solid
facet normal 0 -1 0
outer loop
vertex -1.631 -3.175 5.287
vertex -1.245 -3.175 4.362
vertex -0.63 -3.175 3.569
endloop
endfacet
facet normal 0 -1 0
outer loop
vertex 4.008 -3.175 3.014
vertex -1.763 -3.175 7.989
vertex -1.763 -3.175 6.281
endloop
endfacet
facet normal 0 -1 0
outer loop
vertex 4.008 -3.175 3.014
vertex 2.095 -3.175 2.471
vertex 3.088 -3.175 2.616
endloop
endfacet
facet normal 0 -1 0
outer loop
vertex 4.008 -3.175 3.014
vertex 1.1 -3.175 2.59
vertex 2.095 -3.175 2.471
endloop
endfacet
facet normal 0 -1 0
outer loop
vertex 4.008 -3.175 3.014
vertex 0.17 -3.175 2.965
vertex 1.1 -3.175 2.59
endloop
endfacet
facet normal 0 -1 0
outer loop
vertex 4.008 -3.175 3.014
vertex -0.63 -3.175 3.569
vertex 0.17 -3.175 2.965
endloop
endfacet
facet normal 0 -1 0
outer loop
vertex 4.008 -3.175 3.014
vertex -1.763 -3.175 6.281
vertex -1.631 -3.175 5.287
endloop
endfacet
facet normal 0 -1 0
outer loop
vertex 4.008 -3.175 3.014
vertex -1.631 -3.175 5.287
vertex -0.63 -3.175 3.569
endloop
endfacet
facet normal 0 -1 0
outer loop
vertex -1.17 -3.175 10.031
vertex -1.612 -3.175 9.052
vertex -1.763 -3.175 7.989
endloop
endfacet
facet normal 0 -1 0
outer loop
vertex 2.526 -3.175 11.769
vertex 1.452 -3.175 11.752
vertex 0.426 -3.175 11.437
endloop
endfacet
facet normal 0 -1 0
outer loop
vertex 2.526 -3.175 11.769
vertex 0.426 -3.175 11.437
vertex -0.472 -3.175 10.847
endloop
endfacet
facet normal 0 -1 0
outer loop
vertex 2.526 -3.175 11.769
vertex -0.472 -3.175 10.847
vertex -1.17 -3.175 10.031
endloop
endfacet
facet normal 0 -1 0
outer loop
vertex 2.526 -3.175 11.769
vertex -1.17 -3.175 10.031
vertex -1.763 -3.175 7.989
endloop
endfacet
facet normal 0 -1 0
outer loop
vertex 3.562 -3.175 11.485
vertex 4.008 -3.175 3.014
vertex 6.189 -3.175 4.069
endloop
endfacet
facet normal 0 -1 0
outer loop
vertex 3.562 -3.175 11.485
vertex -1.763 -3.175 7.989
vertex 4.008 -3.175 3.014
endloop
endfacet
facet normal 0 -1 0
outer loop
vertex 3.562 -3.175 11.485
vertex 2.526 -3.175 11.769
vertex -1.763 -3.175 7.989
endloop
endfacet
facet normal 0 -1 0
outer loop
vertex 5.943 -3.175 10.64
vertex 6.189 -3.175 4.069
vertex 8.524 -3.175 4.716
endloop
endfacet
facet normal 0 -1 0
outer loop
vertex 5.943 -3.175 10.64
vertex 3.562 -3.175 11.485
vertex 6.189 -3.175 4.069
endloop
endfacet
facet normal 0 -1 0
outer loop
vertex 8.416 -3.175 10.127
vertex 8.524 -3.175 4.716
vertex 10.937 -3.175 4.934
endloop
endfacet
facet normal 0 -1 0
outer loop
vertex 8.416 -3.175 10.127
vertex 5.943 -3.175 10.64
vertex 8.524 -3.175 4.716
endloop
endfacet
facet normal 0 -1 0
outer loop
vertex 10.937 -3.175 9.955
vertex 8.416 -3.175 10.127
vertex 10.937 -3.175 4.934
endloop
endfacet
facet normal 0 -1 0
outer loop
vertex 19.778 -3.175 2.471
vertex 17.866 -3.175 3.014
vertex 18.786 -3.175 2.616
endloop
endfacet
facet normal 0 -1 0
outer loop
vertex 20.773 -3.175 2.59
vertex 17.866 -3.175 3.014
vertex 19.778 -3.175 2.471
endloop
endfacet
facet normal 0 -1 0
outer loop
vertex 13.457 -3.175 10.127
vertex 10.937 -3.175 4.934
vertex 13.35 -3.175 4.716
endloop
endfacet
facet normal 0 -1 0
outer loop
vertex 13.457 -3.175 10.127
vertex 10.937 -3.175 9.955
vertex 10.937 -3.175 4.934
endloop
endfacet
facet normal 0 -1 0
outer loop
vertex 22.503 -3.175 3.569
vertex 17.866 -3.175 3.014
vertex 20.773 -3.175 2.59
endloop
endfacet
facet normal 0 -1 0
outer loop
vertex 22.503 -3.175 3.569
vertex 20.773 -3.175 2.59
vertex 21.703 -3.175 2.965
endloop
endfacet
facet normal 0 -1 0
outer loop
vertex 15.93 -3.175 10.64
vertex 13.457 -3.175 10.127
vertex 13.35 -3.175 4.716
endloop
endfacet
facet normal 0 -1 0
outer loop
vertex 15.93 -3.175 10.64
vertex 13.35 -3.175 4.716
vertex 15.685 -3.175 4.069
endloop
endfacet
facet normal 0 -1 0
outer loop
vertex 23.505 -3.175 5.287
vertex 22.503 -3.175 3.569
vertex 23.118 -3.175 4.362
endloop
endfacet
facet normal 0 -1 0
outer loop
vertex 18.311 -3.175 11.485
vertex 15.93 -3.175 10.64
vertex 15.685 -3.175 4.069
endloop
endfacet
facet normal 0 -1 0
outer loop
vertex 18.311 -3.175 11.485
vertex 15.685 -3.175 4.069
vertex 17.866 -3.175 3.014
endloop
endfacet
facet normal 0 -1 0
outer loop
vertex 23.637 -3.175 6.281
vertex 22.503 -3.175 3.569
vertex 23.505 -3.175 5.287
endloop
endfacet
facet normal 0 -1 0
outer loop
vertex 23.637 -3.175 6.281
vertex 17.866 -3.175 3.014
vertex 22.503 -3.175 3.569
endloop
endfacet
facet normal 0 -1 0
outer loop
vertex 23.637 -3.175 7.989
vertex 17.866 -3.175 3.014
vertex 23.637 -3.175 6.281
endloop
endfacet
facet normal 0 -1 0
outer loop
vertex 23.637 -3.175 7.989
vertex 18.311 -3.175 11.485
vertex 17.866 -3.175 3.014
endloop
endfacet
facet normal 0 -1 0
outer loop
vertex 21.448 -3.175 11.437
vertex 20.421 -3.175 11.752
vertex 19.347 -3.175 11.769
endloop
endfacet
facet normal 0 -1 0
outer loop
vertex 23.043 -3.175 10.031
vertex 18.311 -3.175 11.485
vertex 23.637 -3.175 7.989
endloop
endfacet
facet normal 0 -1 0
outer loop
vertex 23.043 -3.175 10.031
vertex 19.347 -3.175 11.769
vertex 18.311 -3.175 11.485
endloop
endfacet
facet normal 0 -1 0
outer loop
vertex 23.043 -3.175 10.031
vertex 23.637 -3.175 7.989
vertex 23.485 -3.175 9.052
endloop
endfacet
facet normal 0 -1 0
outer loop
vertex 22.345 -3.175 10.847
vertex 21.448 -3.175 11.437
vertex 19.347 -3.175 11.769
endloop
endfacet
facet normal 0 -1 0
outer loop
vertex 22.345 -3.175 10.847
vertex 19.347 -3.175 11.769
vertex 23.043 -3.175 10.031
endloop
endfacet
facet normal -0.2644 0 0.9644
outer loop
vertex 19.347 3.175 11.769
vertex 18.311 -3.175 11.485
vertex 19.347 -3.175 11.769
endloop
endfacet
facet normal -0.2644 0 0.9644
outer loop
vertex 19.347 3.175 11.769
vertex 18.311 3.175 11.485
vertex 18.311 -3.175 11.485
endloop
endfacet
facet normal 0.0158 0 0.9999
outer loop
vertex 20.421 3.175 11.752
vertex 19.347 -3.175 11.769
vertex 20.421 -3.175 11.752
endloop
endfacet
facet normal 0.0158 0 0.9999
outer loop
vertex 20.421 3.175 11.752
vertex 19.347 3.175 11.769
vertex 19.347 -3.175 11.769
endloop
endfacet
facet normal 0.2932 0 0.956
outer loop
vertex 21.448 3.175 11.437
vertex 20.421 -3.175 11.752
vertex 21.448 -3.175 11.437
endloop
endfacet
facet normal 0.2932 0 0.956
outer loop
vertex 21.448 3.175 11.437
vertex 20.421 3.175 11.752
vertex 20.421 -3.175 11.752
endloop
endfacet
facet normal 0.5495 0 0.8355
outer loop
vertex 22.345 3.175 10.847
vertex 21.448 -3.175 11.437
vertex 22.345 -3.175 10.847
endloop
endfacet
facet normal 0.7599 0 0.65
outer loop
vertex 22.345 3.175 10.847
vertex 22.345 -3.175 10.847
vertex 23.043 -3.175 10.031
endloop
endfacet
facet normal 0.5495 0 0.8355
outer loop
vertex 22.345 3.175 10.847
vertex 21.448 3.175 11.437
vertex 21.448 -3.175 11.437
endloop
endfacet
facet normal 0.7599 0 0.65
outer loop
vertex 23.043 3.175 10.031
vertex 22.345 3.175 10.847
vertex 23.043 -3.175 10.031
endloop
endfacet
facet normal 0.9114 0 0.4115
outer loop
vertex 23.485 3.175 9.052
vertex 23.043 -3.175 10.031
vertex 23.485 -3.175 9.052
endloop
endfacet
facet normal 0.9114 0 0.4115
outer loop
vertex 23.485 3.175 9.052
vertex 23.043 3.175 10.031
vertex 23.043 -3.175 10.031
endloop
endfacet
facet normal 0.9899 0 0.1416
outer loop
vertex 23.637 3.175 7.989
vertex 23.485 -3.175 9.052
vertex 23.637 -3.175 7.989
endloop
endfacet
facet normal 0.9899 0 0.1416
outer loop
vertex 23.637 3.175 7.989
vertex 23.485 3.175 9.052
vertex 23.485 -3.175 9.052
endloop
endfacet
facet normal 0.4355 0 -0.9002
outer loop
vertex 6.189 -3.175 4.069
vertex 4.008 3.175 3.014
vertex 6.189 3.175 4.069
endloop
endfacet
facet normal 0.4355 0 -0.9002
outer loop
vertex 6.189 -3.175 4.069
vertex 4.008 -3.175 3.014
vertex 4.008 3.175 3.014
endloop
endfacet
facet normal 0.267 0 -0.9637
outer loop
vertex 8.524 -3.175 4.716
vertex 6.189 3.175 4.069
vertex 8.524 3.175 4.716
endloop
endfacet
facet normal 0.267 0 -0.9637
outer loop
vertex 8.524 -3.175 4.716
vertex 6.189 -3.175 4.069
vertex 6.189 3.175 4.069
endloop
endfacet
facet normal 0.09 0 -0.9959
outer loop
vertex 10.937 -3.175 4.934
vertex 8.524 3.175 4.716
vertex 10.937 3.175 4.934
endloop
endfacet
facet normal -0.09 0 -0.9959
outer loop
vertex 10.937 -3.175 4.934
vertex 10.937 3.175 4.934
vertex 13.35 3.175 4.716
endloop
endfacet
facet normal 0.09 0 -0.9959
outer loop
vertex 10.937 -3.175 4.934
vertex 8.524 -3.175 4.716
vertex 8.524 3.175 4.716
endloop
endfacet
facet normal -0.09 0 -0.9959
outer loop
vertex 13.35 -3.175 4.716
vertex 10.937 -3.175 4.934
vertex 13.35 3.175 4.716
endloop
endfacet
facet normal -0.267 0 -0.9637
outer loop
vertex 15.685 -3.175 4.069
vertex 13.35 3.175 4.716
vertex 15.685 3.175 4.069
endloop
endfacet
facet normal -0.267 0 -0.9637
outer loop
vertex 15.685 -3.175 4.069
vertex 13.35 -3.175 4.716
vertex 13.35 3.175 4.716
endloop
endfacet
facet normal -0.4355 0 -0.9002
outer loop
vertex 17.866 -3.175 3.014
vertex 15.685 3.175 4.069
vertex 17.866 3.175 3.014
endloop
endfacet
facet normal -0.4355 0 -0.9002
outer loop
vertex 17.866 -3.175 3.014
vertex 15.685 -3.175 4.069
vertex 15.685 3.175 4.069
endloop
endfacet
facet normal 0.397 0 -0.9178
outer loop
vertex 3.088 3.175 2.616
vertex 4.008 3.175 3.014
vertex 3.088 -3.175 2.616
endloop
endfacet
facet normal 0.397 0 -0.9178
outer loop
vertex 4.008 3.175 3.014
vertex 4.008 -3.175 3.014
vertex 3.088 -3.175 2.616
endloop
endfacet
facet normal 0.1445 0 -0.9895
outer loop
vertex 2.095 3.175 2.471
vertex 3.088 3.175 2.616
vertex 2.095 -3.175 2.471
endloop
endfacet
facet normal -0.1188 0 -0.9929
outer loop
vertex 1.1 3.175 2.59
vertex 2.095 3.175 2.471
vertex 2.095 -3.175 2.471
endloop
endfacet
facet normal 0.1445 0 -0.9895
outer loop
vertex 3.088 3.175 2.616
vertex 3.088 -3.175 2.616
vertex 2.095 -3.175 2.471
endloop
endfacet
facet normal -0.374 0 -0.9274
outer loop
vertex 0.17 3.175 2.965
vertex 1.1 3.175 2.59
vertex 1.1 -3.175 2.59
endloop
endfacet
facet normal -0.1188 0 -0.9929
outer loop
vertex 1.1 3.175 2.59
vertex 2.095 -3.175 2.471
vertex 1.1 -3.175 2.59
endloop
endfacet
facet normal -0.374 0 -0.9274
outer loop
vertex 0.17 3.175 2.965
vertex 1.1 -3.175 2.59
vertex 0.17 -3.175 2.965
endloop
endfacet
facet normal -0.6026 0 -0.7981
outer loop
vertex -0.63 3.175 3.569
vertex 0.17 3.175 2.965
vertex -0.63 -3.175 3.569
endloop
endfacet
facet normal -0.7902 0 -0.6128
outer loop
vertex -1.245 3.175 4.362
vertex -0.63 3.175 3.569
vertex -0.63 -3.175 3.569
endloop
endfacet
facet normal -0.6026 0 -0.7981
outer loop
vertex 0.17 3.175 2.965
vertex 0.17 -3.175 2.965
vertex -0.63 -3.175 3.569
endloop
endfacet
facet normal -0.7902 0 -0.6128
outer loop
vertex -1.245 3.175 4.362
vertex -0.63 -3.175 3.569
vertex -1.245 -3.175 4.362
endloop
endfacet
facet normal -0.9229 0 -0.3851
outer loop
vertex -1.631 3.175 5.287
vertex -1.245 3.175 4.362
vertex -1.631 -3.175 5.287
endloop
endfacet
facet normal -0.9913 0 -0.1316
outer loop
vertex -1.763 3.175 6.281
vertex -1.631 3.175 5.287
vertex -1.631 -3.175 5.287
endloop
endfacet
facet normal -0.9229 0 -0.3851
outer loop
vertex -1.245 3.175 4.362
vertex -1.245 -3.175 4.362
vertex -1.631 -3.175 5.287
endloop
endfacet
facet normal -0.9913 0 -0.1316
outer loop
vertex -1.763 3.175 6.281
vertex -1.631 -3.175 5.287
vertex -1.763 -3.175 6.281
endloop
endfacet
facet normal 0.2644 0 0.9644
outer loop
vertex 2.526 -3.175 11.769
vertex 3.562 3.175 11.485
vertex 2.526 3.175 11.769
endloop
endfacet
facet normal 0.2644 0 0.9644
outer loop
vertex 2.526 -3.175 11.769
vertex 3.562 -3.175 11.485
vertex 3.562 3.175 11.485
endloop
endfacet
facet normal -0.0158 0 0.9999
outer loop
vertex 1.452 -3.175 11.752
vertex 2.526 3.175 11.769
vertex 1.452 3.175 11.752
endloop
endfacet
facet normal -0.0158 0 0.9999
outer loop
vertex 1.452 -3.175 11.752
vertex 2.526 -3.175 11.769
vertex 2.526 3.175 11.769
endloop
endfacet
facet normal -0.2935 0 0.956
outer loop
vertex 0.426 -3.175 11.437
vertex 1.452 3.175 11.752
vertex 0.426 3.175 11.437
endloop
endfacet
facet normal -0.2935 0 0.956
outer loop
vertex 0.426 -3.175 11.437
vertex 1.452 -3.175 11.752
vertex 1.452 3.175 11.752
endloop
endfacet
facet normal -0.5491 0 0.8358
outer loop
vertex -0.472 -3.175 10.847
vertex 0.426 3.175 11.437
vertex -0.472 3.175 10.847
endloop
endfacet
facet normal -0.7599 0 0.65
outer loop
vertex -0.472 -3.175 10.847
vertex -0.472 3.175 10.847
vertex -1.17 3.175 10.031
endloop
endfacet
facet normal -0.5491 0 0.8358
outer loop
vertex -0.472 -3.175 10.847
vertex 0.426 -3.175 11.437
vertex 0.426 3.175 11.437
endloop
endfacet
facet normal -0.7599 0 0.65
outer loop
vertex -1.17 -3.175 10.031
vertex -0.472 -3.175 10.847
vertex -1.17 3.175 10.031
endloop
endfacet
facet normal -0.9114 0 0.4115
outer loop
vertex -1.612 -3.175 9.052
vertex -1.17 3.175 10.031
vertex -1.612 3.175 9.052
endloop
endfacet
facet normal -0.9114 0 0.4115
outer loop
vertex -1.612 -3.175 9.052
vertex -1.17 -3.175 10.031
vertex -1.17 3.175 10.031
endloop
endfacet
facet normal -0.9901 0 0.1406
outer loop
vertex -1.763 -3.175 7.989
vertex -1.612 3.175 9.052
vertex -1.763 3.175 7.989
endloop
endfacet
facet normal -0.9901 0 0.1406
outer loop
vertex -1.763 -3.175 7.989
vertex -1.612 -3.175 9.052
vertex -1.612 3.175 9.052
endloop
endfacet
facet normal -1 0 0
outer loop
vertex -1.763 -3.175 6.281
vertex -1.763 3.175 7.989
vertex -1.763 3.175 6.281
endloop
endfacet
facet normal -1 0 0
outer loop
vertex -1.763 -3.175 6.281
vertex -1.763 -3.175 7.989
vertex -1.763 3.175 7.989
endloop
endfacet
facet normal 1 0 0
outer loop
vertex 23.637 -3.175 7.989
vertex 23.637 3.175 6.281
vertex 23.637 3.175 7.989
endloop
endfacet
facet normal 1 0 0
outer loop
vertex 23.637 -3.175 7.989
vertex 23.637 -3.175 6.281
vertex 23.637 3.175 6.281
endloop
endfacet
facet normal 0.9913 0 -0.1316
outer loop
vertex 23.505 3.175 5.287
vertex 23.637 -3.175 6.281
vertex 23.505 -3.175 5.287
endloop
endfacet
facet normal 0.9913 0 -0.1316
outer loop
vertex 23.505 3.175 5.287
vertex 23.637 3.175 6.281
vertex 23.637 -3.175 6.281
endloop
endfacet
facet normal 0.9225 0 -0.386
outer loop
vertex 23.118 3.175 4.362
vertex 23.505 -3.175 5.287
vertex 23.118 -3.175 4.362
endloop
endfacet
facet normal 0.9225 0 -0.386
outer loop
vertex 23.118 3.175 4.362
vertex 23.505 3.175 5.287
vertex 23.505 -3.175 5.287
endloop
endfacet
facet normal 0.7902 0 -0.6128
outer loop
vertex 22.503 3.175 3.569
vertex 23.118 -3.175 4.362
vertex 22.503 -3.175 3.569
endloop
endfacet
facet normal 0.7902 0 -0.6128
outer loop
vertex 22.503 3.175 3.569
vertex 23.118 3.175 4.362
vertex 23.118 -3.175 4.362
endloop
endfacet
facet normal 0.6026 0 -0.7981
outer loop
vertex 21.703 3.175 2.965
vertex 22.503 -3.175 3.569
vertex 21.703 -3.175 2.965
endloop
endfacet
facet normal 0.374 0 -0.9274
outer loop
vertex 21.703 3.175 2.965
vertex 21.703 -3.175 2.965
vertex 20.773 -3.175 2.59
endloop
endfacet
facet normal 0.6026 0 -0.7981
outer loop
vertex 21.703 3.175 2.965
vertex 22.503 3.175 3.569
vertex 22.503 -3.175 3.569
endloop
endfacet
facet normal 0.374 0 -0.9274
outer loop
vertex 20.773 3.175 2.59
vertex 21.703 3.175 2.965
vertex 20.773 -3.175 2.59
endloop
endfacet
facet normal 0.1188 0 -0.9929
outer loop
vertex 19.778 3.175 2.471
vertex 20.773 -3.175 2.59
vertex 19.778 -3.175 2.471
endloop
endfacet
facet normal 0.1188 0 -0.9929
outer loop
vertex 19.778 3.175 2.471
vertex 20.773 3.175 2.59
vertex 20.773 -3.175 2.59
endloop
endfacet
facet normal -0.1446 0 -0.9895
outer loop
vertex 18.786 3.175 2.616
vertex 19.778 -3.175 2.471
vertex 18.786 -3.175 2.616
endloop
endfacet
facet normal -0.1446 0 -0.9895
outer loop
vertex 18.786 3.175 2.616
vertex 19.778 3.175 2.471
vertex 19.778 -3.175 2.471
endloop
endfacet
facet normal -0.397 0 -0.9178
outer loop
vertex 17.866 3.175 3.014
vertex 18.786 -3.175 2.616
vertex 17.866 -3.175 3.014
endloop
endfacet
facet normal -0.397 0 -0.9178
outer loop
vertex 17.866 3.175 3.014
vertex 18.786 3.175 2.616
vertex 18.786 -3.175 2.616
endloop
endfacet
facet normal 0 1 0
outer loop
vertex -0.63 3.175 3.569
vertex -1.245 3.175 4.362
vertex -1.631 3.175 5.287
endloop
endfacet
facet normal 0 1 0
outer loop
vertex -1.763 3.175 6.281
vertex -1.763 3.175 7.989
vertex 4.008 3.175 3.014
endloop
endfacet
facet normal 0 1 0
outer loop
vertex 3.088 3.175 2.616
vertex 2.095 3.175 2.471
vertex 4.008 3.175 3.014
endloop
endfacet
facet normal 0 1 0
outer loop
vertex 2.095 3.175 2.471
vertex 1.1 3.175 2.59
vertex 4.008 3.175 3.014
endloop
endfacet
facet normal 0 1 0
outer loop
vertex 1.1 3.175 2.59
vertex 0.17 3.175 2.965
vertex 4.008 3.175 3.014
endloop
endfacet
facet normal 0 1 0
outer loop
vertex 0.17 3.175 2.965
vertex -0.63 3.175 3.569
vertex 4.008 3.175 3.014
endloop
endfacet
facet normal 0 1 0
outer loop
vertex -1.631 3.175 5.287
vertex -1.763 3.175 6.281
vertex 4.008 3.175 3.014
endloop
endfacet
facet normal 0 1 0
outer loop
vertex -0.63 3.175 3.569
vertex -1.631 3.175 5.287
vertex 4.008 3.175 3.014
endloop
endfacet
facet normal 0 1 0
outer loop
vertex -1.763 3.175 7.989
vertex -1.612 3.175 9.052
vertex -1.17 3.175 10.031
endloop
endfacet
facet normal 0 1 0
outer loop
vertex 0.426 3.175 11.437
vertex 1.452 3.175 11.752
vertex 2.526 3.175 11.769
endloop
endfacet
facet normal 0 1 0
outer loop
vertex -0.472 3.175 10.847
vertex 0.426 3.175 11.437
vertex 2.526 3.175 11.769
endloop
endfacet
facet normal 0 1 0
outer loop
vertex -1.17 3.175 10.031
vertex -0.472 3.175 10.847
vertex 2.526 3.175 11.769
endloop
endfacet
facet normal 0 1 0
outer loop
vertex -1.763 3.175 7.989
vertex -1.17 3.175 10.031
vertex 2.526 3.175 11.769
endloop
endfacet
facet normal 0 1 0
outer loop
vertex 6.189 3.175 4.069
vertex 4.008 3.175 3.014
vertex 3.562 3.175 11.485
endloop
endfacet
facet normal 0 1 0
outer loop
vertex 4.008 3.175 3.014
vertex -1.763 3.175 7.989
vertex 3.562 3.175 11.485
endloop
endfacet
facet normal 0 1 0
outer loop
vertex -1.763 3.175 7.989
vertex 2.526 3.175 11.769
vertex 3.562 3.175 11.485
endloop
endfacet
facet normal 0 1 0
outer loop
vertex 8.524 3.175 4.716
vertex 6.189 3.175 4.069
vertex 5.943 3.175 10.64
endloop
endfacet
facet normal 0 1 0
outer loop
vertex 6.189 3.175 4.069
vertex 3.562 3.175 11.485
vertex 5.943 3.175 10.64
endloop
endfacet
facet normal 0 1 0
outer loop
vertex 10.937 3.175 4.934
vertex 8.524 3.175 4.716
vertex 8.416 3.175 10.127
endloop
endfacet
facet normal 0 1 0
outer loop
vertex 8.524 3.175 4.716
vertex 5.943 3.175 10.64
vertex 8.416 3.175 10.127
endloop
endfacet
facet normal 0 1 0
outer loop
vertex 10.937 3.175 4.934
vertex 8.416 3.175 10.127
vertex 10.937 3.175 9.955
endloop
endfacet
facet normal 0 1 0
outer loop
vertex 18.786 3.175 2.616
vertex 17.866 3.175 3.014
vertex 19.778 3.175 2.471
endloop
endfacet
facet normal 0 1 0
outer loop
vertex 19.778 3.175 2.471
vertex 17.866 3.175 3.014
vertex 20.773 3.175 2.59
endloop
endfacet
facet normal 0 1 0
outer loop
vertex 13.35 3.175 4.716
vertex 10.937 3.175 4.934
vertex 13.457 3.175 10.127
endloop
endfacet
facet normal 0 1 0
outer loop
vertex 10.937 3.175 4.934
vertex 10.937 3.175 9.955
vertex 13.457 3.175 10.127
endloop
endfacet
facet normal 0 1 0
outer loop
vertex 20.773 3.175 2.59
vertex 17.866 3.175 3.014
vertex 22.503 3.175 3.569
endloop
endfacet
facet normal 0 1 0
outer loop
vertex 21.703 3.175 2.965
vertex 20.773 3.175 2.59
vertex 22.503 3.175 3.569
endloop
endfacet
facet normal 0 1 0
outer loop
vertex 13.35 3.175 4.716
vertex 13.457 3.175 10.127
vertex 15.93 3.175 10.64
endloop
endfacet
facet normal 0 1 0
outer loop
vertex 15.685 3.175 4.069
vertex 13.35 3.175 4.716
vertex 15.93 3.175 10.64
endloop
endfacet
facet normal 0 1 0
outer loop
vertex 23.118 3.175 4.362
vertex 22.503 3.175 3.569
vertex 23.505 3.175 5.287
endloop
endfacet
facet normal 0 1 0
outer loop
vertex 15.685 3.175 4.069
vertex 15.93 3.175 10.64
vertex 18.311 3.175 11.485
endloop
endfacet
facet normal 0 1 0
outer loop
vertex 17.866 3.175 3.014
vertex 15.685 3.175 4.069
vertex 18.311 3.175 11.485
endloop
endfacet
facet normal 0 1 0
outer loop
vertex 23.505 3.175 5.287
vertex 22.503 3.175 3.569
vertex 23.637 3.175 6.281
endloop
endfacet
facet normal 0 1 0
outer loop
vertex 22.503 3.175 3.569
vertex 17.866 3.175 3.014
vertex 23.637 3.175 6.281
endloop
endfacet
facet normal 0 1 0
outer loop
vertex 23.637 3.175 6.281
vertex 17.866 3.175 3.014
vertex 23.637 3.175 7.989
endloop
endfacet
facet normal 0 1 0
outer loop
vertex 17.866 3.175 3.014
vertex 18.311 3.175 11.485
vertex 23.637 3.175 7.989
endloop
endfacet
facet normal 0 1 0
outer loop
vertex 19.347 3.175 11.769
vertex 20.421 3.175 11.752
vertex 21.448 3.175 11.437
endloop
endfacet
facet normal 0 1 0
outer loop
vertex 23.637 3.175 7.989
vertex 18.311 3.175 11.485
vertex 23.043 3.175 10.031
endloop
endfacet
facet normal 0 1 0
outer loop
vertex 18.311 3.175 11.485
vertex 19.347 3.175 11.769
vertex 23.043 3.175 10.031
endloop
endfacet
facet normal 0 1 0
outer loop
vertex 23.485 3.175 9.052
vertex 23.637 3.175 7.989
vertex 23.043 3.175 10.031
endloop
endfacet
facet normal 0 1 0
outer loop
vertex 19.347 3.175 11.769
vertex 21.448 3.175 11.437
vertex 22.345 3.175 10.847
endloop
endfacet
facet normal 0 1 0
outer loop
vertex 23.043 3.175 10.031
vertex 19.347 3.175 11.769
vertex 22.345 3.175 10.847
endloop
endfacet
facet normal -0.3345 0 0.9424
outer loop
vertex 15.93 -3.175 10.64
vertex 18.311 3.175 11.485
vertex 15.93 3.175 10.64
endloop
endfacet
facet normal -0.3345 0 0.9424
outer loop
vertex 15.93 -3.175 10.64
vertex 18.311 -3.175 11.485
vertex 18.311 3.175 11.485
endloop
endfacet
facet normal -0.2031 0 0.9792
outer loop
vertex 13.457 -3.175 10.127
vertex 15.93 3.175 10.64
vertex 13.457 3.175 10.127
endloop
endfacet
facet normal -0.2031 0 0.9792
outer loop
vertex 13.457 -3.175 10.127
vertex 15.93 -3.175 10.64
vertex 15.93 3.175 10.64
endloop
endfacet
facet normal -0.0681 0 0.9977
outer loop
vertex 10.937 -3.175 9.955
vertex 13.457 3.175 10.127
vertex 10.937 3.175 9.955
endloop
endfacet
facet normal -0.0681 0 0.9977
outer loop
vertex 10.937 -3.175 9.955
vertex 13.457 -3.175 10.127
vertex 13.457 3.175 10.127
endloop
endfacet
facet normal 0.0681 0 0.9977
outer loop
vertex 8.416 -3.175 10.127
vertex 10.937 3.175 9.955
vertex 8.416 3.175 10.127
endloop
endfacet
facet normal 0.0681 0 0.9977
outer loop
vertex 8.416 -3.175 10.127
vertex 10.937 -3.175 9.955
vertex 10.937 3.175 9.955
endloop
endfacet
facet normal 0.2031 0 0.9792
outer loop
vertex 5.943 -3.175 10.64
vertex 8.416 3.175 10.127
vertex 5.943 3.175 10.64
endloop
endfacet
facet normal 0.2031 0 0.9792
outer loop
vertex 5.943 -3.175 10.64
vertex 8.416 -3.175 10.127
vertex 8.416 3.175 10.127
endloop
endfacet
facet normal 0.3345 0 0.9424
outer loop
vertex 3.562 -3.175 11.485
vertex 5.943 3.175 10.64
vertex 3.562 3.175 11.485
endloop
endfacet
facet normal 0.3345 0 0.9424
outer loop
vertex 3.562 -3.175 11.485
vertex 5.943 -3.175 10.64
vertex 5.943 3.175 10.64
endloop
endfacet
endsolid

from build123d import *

# Parameters (mm, degrees)
F1_DEPTH = 3.175
F2_R     = 3.81


with BuildPart() as f1:
    # F0 (on Front) → F1 (new body, symmetric)
    with BuildSketch(Plane.XZ):
        with BuildLine():
            ThreePointArc((23.63662, 14.987046), (10.93662, 9.954885), (-1.76338, 14.987046))
            Line((-1.76338, 14.987046), (-1.76338, -4.062954))
            ThreePointArc((-1.76338, -4.062954), (10.93662, 4.934133), (23.63662, -4.062954))
            Line((23.63662, -4.062954), (23.63662, 14.987046))
        make_face()
    extrude(amount=F1_DEPTH, both=True)

    # F2
    f2_edges = [f1.edges().sort_by_distance(p)[0] for p in [
        (23.63662, 0, 14.987046),
        (23.63662, 0, -4.062954),
        (-1.76338, 0, -4.062954),
        (-1.76338, 0, 14.987046),
    ]]
    fillet(f2_edges, radius=F2_R)


solid = f1.part
